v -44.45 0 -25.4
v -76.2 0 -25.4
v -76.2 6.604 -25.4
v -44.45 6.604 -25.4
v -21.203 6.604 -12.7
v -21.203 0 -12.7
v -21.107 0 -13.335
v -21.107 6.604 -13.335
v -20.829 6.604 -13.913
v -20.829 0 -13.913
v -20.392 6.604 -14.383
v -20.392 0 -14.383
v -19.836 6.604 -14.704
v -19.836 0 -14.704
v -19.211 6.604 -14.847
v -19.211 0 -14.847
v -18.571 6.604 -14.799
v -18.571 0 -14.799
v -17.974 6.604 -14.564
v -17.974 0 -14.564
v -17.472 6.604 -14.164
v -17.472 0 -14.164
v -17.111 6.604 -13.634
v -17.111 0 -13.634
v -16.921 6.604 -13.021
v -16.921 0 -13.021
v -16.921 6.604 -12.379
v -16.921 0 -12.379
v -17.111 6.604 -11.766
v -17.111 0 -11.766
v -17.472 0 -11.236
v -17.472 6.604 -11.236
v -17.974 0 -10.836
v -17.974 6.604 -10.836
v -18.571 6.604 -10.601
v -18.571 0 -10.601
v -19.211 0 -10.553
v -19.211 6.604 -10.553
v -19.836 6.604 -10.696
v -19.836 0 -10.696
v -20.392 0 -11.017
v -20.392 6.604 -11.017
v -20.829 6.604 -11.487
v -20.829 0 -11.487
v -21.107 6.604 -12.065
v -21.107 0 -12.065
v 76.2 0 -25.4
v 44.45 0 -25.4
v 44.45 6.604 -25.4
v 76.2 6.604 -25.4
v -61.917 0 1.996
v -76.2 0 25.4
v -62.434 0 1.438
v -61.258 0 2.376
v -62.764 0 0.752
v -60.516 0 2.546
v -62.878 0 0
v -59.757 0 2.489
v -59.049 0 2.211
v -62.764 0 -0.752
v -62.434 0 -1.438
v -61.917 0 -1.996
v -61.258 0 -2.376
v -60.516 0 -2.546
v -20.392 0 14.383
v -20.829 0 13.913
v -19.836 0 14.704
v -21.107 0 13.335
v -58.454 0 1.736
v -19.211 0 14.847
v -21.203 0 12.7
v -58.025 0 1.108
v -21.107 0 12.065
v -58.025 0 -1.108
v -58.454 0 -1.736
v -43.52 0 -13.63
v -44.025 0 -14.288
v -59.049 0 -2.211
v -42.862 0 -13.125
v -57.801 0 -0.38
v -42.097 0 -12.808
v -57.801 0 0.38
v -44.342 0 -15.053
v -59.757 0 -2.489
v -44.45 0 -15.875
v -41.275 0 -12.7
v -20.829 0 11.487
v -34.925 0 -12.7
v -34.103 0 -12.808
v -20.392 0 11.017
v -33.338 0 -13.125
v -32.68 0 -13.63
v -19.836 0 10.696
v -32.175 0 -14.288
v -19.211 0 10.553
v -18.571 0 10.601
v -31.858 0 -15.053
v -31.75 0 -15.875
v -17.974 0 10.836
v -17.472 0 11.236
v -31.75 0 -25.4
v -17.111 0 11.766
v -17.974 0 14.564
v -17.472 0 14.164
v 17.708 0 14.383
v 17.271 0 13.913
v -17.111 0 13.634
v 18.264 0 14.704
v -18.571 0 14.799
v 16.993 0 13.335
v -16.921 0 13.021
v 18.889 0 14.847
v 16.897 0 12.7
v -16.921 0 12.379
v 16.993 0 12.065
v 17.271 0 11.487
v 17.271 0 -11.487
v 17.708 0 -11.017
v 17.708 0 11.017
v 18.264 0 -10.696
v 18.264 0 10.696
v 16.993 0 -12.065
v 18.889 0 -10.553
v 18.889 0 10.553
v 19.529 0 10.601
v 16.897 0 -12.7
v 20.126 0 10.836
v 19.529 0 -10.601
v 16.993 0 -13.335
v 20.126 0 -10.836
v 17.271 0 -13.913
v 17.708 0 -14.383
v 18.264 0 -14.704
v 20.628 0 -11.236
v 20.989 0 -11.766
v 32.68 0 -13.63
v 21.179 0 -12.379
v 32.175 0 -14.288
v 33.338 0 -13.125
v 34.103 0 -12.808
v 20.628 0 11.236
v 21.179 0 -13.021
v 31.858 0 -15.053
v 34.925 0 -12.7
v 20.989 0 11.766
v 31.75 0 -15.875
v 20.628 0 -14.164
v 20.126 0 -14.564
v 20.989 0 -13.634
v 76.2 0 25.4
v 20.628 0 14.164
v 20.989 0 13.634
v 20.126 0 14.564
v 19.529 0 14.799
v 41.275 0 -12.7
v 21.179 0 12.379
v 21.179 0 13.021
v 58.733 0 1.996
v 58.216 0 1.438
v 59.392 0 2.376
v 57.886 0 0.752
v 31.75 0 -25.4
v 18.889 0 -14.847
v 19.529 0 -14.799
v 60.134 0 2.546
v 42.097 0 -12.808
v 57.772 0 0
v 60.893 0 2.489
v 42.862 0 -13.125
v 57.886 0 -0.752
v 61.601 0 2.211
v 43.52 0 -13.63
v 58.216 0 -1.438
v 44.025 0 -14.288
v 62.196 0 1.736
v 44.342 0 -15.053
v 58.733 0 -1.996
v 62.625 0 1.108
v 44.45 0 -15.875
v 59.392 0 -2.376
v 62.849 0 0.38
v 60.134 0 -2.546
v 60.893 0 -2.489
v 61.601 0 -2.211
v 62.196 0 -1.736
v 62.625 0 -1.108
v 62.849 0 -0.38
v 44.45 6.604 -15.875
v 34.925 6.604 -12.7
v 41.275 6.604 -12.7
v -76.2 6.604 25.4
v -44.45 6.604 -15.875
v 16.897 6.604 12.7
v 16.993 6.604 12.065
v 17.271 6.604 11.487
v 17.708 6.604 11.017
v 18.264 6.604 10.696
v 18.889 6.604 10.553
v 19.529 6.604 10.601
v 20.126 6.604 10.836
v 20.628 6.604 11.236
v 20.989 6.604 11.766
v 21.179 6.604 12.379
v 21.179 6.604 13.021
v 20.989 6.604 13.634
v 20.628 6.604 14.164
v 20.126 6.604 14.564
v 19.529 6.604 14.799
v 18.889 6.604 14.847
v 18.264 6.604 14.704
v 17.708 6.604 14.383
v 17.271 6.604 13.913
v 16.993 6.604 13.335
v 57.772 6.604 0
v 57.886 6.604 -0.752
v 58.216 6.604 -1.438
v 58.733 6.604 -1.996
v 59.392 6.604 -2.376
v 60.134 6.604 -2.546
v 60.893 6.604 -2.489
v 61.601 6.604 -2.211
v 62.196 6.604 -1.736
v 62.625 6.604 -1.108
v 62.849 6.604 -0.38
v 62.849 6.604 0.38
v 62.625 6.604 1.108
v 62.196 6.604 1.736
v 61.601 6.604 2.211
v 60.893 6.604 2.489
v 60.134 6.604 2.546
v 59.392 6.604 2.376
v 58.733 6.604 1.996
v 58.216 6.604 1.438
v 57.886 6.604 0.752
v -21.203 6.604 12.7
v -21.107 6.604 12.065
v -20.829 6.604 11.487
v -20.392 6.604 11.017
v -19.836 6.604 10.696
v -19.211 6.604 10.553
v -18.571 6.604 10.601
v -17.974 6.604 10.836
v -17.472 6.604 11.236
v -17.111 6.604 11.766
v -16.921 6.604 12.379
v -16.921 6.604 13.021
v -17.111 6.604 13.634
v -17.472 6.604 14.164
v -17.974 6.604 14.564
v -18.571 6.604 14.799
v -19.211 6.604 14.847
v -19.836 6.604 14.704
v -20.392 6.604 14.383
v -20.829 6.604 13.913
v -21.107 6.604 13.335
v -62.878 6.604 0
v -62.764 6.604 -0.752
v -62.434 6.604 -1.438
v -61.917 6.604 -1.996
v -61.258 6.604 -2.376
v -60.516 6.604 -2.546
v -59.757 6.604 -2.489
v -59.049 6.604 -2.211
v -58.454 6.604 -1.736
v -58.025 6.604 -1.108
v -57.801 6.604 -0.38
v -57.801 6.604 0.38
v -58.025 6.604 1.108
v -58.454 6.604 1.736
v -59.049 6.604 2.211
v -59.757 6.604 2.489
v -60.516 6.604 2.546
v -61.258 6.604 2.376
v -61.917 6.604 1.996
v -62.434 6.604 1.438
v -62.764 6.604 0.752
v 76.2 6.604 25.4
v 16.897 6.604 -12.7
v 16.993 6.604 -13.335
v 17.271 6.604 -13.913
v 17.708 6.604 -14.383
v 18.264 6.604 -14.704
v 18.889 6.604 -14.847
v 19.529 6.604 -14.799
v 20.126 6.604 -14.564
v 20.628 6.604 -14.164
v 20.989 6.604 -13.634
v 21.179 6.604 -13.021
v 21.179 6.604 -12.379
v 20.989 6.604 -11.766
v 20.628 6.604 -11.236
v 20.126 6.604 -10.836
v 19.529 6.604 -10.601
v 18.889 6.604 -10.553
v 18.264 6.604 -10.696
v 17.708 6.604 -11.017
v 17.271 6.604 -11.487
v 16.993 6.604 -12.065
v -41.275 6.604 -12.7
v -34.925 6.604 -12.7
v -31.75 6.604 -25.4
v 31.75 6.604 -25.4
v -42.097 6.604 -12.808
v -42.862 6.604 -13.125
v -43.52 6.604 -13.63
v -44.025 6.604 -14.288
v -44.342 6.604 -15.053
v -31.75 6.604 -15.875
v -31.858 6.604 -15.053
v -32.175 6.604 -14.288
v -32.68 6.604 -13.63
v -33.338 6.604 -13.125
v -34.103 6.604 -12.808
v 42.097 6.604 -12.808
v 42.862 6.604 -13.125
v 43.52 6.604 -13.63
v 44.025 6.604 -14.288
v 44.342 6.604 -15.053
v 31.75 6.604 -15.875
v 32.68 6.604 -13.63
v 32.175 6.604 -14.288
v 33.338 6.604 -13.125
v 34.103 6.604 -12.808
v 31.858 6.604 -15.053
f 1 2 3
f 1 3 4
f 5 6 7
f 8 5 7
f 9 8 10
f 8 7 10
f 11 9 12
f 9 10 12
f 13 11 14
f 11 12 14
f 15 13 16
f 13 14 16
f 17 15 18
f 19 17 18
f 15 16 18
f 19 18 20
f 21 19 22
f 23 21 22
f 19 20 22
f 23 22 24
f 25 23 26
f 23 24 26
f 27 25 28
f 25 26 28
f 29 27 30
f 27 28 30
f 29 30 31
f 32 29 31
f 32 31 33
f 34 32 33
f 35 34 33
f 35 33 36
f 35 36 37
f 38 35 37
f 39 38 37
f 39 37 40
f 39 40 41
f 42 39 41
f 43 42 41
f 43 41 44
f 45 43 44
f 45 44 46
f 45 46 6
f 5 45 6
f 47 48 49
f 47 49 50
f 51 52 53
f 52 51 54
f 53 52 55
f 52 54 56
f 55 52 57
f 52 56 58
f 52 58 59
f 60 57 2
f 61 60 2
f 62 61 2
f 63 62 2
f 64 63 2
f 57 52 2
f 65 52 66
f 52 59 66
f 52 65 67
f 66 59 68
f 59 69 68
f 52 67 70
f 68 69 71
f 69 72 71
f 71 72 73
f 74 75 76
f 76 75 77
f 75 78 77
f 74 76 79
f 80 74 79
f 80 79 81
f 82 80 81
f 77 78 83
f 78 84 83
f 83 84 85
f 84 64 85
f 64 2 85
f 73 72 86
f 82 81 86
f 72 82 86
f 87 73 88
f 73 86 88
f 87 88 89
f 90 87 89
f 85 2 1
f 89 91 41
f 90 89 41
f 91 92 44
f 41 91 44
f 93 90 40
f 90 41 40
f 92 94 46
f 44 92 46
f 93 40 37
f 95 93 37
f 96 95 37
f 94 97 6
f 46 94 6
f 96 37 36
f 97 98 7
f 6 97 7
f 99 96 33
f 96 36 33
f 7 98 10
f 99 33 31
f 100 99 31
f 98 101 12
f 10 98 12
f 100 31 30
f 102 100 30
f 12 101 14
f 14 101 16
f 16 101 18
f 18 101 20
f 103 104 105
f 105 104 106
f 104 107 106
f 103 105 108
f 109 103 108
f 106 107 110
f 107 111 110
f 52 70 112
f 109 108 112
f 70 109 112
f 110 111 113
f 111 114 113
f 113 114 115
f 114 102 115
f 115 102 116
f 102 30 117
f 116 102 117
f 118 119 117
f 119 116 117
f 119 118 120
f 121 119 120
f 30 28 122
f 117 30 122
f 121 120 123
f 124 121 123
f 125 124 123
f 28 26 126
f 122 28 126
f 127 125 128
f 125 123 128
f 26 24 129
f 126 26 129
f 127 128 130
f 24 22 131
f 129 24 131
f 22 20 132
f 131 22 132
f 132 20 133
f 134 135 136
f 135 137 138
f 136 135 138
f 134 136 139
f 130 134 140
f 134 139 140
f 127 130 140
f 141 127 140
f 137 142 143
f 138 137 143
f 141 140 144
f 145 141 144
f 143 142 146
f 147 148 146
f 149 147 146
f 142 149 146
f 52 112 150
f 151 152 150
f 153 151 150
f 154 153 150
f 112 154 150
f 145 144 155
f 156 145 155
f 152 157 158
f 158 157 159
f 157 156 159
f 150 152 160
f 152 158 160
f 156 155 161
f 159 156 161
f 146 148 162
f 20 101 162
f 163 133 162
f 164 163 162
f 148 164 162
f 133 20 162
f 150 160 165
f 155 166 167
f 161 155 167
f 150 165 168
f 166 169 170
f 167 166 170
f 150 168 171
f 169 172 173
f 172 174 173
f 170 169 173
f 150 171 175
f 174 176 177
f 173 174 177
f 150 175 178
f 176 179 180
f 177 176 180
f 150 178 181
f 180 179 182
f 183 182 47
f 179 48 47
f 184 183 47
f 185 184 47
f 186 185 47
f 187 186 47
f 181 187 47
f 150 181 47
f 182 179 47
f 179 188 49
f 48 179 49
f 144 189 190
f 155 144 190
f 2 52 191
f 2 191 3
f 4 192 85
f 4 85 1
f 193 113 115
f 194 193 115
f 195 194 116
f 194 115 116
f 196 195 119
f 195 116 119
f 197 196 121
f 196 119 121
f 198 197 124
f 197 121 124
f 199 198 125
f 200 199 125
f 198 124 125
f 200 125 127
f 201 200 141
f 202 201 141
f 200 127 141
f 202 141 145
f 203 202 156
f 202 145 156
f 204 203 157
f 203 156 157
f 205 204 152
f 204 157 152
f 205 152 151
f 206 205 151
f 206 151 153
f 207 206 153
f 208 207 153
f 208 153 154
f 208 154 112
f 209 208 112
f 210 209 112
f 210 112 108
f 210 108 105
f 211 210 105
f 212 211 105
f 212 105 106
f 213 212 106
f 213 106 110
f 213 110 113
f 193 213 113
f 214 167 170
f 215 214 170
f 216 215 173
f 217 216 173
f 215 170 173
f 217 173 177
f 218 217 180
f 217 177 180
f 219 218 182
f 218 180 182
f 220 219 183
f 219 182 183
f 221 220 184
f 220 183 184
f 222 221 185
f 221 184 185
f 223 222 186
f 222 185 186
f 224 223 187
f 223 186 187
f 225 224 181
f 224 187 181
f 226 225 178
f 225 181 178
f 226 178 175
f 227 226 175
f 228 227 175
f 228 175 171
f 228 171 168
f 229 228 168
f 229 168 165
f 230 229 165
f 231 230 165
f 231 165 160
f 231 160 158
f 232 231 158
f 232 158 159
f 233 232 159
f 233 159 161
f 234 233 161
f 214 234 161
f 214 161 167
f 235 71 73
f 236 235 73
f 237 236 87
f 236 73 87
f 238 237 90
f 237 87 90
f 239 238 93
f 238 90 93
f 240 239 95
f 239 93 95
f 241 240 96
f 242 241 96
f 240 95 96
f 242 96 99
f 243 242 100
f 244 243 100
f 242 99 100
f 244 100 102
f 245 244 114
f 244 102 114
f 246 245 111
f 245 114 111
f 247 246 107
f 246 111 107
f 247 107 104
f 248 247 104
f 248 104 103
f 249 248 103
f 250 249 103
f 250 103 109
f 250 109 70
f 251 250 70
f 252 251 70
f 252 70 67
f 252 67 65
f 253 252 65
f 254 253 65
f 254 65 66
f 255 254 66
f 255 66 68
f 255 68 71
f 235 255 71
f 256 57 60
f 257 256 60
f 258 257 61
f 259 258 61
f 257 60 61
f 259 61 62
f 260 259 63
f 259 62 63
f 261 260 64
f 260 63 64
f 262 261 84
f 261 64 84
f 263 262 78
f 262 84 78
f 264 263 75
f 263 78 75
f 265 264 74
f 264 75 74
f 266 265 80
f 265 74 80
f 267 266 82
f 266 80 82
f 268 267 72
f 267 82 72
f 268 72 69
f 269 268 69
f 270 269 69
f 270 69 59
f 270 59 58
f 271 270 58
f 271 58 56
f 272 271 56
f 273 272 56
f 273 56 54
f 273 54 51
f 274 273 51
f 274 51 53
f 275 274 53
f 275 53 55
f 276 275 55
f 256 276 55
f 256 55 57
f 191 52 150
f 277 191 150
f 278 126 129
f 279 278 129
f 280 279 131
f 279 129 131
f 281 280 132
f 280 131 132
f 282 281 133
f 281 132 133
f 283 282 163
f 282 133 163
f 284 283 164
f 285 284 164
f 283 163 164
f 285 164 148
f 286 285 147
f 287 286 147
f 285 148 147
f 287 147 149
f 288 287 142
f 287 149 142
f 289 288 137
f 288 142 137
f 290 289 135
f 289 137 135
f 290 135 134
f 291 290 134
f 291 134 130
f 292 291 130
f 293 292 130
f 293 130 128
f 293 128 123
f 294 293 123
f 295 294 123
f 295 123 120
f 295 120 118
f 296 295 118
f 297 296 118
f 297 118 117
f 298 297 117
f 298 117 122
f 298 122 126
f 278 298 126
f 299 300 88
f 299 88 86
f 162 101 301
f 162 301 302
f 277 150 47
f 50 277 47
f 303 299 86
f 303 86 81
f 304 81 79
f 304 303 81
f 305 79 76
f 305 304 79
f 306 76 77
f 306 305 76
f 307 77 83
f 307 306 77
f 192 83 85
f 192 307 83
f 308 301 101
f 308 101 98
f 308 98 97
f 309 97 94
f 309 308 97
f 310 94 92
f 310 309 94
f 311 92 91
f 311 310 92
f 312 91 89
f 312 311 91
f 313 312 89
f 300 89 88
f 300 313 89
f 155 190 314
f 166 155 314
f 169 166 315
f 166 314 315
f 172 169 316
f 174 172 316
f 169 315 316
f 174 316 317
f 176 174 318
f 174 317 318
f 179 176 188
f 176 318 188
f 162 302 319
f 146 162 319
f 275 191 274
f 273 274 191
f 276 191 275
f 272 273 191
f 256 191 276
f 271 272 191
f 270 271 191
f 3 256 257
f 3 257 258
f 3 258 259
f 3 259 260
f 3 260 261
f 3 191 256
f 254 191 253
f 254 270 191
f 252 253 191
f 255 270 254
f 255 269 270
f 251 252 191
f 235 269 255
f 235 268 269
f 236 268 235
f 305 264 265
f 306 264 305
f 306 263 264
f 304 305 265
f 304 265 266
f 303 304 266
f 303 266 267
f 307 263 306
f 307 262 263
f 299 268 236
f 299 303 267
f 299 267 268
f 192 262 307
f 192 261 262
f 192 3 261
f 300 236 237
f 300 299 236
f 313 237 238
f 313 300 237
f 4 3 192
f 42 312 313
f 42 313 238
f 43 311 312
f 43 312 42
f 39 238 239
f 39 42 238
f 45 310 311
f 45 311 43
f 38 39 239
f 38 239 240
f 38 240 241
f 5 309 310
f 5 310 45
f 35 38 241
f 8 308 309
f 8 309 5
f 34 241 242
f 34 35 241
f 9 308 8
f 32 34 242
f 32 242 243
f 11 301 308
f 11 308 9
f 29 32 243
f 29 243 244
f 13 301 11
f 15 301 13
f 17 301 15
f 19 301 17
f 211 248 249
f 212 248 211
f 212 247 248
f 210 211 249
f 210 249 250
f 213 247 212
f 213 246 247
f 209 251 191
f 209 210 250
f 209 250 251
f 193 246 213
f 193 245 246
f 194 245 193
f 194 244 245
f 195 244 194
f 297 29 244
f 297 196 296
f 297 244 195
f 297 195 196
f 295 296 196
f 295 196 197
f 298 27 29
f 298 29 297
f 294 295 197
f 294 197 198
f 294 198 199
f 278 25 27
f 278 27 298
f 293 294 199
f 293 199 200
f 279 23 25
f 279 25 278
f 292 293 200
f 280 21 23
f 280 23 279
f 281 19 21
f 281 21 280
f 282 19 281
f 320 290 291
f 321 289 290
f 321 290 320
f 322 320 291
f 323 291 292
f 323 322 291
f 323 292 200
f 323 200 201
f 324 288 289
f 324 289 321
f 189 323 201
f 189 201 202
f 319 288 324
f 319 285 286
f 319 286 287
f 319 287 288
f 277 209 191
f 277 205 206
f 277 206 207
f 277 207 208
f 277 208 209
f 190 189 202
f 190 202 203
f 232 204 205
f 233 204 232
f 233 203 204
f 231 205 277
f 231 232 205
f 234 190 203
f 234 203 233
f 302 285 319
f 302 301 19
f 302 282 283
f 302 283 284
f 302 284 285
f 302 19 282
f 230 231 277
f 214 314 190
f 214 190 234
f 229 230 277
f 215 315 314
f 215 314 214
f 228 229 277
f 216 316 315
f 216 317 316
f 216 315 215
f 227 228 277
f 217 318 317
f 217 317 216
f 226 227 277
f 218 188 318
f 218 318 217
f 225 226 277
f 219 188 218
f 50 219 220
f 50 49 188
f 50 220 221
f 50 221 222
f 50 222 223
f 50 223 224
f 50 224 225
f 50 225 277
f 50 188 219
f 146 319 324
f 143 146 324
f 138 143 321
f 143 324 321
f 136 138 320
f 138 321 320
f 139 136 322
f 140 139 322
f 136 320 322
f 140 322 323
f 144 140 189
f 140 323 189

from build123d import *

# Parameters (mm, degrees)
SKETCH1_W                   = 152.4
SKETCH1_H                   = 50.8
BOSS_EXTRUDE1_DEPTH         = 6.604
CUT_EXTRUDE1_DEPTH          = 7.604
F_1_4_20_TAPPED_HOLE1_D     = 5.1054
F_1_4_20_TAPPED_HOLE1_DEPTH = 16.51
F_1_4_20_TAPPED_HOLE1_TIP   = 1.533816902
F_8_CLEARANCE_HOLE1_D       = 4.3053
F_8_CLEARANCE_HOLE1_DEPTH   = 7.62
F_8_CLEARANCE_HOLE1_TIP     = 1.293442612


with BuildPart() as part:
    # Sketch1 → Boss-Extrude1 (new body)
    with BuildSketch(Plane(origin=(0, 0, 0), x_dir=(1, 0, 0), z_dir=(0, 1, 0))):
        Rectangle(SKETCH1_W, SKETCH1_H)
    extrude(amount=BOSS_EXTRUDE1_DEPTH)

    # Sketch2 → Cut-Extrude1 (cut, through all)
    with BuildSketch(Plane(origin=(0, 6.604, 0), x_dir=(1, 0, 0), z_dir=(0, 1, 0))):
        with BuildLine():
            Line((-44.45, 25.4), (-31.75, 25.4))
            Line((-31.75, 25.4), (-31.75, 15.875))
            ThreePointArc((-31.75, 15.875), (-32.67993597, 13.62993597), (-34.925, 12.7))
            Line((-34.925, 12.7), (-41.275, 12.7))
            ThreePointArc((-41.275, 12.7), (-43.52006403, 13.62993597), (-44.45, 15.875))
            Line((-44.45, 15.875), (-44.45, 25.4))
        make_face()
    cut_extrude1 = extrude(amount=-CUT_EXTRUDE1_DEPTH, mode=Mode.SUBTRACT)

    # Mirror1: Cut-Extrude1 across plane
    add(cut_extrude1.mirror(Plane(origin=(0, 0, 0), x_dir=(0, 0, 1), z_dir=(1, 0, 0))), mode=Mode.SUBTRACT)

    # 1/4-20 Tapped Hole1
    with Locations(Plane(origin=(0, 6.604, 0), x_dir=(1, 0, 0), z_dir=(0, 1, 0))):
        with Locations((-60.325, 0), (60.325, 0)):
            Hole(F_1_4_20_TAPPED_HOLE1_D / 2, depth=F_1_4_20_TAPPED_HOLE1_DEPTH)
            with Locations((0, 0, -(F_1_4_20_TAPPED_HOLE1_DEPTH + F_1_4_20_TAPPED_HOLE1_TIP / 2))):  # 118° drill point
                Cone(0, F_1_4_20_TAPPED_HOLE1_D / 2, F_1_4_20_TAPPED_HOLE1_TIP, mode=Mode.SUBTRACT)

    # #8 Clearance Hole1
    with Locations(Plane(origin=(0, 6.604, 0), x_dir=(1, 0, 0), z_dir=(0, 1, 0))):
        with Locations((-19.05, 12.7), (-19.05, -12.7), (19.05, 12.7), (19.05, -12.7)):
            Hole(F_8_CLEARANCE_HOLE1_D / 2, depth=F_8_CLEARANCE_HOLE1_DEPTH)
            with Locations((0, 0, -(F_8_CLEARANCE_HOLE1_DEPTH + F_8_CLEARANCE_HOLE1_TIP / 2))):  # 118° drill point
                Cone(0, F_8_CLEARANCE_HOLE1_D / 2, F_8_CLEARANCE_HOLE1_TIP, mode=Mode.SUBTRACT)


solid = part.part
